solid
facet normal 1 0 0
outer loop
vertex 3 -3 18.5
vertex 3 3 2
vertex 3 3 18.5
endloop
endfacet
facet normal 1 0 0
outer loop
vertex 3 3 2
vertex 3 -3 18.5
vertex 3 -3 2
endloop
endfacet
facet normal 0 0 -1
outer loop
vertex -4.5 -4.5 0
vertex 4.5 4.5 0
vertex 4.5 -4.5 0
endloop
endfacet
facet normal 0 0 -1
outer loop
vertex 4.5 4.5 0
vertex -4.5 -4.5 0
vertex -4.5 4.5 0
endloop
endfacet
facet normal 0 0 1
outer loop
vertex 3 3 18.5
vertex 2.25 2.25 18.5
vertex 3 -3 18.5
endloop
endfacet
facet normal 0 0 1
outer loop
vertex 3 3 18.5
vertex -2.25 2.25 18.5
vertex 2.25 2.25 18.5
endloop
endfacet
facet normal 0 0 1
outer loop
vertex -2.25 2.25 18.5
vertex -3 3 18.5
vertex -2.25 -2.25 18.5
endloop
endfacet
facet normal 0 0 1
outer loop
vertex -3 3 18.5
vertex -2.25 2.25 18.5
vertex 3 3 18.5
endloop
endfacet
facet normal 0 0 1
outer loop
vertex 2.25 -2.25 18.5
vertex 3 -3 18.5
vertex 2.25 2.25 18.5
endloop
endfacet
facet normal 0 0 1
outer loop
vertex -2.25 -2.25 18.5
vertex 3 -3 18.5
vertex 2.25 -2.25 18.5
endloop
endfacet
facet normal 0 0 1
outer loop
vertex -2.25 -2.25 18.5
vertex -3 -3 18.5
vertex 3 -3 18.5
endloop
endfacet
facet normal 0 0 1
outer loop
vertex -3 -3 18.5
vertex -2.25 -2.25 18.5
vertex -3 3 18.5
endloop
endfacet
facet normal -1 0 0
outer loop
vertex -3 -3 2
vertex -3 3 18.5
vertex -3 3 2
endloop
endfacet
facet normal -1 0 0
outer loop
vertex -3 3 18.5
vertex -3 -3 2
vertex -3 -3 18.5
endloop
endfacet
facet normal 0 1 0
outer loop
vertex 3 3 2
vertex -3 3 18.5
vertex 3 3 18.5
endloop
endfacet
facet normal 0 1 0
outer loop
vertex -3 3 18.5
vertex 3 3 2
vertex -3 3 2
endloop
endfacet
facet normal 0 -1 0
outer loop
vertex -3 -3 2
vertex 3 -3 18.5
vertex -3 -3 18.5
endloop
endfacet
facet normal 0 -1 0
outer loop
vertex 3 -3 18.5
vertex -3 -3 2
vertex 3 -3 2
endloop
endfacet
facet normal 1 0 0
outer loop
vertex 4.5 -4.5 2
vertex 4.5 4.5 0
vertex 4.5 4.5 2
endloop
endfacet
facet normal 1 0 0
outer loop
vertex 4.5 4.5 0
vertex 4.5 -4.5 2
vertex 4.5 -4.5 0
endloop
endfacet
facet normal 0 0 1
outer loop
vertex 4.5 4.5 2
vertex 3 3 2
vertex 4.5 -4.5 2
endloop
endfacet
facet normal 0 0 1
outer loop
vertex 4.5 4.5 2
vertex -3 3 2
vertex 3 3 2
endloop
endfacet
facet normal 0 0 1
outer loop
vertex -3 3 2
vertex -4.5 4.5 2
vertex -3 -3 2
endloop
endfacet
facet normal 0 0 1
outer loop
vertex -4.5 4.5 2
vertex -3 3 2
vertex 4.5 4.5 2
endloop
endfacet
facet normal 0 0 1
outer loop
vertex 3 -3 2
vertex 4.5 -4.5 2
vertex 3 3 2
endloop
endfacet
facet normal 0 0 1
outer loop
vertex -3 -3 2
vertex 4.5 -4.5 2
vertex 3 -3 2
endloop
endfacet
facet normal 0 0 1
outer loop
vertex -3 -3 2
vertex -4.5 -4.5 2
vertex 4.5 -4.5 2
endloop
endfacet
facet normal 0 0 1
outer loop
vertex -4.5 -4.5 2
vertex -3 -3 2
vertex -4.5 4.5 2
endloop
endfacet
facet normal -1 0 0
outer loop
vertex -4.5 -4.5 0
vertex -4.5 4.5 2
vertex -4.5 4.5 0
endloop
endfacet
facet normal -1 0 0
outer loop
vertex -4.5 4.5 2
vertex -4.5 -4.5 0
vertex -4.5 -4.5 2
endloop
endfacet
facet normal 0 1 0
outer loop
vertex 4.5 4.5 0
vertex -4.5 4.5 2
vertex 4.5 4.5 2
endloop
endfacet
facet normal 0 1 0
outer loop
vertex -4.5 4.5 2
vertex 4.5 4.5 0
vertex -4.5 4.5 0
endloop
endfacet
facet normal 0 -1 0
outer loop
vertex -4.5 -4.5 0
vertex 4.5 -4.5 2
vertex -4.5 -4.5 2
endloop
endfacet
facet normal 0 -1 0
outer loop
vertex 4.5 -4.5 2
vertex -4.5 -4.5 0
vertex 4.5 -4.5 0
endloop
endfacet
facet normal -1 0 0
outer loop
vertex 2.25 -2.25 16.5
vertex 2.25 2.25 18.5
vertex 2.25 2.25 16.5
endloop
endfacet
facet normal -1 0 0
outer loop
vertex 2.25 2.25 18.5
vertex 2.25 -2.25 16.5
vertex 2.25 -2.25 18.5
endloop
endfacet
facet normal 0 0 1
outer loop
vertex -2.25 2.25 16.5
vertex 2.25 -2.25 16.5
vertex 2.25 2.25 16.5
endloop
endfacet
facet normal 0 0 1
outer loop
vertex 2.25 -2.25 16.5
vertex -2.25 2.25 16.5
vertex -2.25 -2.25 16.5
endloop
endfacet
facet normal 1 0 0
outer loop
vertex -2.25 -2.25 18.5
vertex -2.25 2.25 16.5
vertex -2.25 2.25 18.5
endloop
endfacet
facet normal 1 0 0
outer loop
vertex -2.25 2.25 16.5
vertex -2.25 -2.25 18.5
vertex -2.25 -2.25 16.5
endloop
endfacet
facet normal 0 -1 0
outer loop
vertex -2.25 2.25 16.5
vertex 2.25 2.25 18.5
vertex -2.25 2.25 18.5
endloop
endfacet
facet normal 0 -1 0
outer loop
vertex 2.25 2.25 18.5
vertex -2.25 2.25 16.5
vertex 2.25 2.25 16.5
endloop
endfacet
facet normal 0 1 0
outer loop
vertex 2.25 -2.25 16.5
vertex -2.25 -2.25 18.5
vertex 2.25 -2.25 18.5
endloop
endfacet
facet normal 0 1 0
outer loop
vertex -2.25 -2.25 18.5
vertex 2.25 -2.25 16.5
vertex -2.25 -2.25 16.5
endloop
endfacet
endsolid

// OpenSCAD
// Guided plunger between cam and button. Print 4 plus spares.
// Print orientation: upright, collar on the bed, tip recess up.
include <params.scad>
include <lib.scad>

translate([0, 0, pl_len]) mirror([0, 0, 1]) servo_plunger();
